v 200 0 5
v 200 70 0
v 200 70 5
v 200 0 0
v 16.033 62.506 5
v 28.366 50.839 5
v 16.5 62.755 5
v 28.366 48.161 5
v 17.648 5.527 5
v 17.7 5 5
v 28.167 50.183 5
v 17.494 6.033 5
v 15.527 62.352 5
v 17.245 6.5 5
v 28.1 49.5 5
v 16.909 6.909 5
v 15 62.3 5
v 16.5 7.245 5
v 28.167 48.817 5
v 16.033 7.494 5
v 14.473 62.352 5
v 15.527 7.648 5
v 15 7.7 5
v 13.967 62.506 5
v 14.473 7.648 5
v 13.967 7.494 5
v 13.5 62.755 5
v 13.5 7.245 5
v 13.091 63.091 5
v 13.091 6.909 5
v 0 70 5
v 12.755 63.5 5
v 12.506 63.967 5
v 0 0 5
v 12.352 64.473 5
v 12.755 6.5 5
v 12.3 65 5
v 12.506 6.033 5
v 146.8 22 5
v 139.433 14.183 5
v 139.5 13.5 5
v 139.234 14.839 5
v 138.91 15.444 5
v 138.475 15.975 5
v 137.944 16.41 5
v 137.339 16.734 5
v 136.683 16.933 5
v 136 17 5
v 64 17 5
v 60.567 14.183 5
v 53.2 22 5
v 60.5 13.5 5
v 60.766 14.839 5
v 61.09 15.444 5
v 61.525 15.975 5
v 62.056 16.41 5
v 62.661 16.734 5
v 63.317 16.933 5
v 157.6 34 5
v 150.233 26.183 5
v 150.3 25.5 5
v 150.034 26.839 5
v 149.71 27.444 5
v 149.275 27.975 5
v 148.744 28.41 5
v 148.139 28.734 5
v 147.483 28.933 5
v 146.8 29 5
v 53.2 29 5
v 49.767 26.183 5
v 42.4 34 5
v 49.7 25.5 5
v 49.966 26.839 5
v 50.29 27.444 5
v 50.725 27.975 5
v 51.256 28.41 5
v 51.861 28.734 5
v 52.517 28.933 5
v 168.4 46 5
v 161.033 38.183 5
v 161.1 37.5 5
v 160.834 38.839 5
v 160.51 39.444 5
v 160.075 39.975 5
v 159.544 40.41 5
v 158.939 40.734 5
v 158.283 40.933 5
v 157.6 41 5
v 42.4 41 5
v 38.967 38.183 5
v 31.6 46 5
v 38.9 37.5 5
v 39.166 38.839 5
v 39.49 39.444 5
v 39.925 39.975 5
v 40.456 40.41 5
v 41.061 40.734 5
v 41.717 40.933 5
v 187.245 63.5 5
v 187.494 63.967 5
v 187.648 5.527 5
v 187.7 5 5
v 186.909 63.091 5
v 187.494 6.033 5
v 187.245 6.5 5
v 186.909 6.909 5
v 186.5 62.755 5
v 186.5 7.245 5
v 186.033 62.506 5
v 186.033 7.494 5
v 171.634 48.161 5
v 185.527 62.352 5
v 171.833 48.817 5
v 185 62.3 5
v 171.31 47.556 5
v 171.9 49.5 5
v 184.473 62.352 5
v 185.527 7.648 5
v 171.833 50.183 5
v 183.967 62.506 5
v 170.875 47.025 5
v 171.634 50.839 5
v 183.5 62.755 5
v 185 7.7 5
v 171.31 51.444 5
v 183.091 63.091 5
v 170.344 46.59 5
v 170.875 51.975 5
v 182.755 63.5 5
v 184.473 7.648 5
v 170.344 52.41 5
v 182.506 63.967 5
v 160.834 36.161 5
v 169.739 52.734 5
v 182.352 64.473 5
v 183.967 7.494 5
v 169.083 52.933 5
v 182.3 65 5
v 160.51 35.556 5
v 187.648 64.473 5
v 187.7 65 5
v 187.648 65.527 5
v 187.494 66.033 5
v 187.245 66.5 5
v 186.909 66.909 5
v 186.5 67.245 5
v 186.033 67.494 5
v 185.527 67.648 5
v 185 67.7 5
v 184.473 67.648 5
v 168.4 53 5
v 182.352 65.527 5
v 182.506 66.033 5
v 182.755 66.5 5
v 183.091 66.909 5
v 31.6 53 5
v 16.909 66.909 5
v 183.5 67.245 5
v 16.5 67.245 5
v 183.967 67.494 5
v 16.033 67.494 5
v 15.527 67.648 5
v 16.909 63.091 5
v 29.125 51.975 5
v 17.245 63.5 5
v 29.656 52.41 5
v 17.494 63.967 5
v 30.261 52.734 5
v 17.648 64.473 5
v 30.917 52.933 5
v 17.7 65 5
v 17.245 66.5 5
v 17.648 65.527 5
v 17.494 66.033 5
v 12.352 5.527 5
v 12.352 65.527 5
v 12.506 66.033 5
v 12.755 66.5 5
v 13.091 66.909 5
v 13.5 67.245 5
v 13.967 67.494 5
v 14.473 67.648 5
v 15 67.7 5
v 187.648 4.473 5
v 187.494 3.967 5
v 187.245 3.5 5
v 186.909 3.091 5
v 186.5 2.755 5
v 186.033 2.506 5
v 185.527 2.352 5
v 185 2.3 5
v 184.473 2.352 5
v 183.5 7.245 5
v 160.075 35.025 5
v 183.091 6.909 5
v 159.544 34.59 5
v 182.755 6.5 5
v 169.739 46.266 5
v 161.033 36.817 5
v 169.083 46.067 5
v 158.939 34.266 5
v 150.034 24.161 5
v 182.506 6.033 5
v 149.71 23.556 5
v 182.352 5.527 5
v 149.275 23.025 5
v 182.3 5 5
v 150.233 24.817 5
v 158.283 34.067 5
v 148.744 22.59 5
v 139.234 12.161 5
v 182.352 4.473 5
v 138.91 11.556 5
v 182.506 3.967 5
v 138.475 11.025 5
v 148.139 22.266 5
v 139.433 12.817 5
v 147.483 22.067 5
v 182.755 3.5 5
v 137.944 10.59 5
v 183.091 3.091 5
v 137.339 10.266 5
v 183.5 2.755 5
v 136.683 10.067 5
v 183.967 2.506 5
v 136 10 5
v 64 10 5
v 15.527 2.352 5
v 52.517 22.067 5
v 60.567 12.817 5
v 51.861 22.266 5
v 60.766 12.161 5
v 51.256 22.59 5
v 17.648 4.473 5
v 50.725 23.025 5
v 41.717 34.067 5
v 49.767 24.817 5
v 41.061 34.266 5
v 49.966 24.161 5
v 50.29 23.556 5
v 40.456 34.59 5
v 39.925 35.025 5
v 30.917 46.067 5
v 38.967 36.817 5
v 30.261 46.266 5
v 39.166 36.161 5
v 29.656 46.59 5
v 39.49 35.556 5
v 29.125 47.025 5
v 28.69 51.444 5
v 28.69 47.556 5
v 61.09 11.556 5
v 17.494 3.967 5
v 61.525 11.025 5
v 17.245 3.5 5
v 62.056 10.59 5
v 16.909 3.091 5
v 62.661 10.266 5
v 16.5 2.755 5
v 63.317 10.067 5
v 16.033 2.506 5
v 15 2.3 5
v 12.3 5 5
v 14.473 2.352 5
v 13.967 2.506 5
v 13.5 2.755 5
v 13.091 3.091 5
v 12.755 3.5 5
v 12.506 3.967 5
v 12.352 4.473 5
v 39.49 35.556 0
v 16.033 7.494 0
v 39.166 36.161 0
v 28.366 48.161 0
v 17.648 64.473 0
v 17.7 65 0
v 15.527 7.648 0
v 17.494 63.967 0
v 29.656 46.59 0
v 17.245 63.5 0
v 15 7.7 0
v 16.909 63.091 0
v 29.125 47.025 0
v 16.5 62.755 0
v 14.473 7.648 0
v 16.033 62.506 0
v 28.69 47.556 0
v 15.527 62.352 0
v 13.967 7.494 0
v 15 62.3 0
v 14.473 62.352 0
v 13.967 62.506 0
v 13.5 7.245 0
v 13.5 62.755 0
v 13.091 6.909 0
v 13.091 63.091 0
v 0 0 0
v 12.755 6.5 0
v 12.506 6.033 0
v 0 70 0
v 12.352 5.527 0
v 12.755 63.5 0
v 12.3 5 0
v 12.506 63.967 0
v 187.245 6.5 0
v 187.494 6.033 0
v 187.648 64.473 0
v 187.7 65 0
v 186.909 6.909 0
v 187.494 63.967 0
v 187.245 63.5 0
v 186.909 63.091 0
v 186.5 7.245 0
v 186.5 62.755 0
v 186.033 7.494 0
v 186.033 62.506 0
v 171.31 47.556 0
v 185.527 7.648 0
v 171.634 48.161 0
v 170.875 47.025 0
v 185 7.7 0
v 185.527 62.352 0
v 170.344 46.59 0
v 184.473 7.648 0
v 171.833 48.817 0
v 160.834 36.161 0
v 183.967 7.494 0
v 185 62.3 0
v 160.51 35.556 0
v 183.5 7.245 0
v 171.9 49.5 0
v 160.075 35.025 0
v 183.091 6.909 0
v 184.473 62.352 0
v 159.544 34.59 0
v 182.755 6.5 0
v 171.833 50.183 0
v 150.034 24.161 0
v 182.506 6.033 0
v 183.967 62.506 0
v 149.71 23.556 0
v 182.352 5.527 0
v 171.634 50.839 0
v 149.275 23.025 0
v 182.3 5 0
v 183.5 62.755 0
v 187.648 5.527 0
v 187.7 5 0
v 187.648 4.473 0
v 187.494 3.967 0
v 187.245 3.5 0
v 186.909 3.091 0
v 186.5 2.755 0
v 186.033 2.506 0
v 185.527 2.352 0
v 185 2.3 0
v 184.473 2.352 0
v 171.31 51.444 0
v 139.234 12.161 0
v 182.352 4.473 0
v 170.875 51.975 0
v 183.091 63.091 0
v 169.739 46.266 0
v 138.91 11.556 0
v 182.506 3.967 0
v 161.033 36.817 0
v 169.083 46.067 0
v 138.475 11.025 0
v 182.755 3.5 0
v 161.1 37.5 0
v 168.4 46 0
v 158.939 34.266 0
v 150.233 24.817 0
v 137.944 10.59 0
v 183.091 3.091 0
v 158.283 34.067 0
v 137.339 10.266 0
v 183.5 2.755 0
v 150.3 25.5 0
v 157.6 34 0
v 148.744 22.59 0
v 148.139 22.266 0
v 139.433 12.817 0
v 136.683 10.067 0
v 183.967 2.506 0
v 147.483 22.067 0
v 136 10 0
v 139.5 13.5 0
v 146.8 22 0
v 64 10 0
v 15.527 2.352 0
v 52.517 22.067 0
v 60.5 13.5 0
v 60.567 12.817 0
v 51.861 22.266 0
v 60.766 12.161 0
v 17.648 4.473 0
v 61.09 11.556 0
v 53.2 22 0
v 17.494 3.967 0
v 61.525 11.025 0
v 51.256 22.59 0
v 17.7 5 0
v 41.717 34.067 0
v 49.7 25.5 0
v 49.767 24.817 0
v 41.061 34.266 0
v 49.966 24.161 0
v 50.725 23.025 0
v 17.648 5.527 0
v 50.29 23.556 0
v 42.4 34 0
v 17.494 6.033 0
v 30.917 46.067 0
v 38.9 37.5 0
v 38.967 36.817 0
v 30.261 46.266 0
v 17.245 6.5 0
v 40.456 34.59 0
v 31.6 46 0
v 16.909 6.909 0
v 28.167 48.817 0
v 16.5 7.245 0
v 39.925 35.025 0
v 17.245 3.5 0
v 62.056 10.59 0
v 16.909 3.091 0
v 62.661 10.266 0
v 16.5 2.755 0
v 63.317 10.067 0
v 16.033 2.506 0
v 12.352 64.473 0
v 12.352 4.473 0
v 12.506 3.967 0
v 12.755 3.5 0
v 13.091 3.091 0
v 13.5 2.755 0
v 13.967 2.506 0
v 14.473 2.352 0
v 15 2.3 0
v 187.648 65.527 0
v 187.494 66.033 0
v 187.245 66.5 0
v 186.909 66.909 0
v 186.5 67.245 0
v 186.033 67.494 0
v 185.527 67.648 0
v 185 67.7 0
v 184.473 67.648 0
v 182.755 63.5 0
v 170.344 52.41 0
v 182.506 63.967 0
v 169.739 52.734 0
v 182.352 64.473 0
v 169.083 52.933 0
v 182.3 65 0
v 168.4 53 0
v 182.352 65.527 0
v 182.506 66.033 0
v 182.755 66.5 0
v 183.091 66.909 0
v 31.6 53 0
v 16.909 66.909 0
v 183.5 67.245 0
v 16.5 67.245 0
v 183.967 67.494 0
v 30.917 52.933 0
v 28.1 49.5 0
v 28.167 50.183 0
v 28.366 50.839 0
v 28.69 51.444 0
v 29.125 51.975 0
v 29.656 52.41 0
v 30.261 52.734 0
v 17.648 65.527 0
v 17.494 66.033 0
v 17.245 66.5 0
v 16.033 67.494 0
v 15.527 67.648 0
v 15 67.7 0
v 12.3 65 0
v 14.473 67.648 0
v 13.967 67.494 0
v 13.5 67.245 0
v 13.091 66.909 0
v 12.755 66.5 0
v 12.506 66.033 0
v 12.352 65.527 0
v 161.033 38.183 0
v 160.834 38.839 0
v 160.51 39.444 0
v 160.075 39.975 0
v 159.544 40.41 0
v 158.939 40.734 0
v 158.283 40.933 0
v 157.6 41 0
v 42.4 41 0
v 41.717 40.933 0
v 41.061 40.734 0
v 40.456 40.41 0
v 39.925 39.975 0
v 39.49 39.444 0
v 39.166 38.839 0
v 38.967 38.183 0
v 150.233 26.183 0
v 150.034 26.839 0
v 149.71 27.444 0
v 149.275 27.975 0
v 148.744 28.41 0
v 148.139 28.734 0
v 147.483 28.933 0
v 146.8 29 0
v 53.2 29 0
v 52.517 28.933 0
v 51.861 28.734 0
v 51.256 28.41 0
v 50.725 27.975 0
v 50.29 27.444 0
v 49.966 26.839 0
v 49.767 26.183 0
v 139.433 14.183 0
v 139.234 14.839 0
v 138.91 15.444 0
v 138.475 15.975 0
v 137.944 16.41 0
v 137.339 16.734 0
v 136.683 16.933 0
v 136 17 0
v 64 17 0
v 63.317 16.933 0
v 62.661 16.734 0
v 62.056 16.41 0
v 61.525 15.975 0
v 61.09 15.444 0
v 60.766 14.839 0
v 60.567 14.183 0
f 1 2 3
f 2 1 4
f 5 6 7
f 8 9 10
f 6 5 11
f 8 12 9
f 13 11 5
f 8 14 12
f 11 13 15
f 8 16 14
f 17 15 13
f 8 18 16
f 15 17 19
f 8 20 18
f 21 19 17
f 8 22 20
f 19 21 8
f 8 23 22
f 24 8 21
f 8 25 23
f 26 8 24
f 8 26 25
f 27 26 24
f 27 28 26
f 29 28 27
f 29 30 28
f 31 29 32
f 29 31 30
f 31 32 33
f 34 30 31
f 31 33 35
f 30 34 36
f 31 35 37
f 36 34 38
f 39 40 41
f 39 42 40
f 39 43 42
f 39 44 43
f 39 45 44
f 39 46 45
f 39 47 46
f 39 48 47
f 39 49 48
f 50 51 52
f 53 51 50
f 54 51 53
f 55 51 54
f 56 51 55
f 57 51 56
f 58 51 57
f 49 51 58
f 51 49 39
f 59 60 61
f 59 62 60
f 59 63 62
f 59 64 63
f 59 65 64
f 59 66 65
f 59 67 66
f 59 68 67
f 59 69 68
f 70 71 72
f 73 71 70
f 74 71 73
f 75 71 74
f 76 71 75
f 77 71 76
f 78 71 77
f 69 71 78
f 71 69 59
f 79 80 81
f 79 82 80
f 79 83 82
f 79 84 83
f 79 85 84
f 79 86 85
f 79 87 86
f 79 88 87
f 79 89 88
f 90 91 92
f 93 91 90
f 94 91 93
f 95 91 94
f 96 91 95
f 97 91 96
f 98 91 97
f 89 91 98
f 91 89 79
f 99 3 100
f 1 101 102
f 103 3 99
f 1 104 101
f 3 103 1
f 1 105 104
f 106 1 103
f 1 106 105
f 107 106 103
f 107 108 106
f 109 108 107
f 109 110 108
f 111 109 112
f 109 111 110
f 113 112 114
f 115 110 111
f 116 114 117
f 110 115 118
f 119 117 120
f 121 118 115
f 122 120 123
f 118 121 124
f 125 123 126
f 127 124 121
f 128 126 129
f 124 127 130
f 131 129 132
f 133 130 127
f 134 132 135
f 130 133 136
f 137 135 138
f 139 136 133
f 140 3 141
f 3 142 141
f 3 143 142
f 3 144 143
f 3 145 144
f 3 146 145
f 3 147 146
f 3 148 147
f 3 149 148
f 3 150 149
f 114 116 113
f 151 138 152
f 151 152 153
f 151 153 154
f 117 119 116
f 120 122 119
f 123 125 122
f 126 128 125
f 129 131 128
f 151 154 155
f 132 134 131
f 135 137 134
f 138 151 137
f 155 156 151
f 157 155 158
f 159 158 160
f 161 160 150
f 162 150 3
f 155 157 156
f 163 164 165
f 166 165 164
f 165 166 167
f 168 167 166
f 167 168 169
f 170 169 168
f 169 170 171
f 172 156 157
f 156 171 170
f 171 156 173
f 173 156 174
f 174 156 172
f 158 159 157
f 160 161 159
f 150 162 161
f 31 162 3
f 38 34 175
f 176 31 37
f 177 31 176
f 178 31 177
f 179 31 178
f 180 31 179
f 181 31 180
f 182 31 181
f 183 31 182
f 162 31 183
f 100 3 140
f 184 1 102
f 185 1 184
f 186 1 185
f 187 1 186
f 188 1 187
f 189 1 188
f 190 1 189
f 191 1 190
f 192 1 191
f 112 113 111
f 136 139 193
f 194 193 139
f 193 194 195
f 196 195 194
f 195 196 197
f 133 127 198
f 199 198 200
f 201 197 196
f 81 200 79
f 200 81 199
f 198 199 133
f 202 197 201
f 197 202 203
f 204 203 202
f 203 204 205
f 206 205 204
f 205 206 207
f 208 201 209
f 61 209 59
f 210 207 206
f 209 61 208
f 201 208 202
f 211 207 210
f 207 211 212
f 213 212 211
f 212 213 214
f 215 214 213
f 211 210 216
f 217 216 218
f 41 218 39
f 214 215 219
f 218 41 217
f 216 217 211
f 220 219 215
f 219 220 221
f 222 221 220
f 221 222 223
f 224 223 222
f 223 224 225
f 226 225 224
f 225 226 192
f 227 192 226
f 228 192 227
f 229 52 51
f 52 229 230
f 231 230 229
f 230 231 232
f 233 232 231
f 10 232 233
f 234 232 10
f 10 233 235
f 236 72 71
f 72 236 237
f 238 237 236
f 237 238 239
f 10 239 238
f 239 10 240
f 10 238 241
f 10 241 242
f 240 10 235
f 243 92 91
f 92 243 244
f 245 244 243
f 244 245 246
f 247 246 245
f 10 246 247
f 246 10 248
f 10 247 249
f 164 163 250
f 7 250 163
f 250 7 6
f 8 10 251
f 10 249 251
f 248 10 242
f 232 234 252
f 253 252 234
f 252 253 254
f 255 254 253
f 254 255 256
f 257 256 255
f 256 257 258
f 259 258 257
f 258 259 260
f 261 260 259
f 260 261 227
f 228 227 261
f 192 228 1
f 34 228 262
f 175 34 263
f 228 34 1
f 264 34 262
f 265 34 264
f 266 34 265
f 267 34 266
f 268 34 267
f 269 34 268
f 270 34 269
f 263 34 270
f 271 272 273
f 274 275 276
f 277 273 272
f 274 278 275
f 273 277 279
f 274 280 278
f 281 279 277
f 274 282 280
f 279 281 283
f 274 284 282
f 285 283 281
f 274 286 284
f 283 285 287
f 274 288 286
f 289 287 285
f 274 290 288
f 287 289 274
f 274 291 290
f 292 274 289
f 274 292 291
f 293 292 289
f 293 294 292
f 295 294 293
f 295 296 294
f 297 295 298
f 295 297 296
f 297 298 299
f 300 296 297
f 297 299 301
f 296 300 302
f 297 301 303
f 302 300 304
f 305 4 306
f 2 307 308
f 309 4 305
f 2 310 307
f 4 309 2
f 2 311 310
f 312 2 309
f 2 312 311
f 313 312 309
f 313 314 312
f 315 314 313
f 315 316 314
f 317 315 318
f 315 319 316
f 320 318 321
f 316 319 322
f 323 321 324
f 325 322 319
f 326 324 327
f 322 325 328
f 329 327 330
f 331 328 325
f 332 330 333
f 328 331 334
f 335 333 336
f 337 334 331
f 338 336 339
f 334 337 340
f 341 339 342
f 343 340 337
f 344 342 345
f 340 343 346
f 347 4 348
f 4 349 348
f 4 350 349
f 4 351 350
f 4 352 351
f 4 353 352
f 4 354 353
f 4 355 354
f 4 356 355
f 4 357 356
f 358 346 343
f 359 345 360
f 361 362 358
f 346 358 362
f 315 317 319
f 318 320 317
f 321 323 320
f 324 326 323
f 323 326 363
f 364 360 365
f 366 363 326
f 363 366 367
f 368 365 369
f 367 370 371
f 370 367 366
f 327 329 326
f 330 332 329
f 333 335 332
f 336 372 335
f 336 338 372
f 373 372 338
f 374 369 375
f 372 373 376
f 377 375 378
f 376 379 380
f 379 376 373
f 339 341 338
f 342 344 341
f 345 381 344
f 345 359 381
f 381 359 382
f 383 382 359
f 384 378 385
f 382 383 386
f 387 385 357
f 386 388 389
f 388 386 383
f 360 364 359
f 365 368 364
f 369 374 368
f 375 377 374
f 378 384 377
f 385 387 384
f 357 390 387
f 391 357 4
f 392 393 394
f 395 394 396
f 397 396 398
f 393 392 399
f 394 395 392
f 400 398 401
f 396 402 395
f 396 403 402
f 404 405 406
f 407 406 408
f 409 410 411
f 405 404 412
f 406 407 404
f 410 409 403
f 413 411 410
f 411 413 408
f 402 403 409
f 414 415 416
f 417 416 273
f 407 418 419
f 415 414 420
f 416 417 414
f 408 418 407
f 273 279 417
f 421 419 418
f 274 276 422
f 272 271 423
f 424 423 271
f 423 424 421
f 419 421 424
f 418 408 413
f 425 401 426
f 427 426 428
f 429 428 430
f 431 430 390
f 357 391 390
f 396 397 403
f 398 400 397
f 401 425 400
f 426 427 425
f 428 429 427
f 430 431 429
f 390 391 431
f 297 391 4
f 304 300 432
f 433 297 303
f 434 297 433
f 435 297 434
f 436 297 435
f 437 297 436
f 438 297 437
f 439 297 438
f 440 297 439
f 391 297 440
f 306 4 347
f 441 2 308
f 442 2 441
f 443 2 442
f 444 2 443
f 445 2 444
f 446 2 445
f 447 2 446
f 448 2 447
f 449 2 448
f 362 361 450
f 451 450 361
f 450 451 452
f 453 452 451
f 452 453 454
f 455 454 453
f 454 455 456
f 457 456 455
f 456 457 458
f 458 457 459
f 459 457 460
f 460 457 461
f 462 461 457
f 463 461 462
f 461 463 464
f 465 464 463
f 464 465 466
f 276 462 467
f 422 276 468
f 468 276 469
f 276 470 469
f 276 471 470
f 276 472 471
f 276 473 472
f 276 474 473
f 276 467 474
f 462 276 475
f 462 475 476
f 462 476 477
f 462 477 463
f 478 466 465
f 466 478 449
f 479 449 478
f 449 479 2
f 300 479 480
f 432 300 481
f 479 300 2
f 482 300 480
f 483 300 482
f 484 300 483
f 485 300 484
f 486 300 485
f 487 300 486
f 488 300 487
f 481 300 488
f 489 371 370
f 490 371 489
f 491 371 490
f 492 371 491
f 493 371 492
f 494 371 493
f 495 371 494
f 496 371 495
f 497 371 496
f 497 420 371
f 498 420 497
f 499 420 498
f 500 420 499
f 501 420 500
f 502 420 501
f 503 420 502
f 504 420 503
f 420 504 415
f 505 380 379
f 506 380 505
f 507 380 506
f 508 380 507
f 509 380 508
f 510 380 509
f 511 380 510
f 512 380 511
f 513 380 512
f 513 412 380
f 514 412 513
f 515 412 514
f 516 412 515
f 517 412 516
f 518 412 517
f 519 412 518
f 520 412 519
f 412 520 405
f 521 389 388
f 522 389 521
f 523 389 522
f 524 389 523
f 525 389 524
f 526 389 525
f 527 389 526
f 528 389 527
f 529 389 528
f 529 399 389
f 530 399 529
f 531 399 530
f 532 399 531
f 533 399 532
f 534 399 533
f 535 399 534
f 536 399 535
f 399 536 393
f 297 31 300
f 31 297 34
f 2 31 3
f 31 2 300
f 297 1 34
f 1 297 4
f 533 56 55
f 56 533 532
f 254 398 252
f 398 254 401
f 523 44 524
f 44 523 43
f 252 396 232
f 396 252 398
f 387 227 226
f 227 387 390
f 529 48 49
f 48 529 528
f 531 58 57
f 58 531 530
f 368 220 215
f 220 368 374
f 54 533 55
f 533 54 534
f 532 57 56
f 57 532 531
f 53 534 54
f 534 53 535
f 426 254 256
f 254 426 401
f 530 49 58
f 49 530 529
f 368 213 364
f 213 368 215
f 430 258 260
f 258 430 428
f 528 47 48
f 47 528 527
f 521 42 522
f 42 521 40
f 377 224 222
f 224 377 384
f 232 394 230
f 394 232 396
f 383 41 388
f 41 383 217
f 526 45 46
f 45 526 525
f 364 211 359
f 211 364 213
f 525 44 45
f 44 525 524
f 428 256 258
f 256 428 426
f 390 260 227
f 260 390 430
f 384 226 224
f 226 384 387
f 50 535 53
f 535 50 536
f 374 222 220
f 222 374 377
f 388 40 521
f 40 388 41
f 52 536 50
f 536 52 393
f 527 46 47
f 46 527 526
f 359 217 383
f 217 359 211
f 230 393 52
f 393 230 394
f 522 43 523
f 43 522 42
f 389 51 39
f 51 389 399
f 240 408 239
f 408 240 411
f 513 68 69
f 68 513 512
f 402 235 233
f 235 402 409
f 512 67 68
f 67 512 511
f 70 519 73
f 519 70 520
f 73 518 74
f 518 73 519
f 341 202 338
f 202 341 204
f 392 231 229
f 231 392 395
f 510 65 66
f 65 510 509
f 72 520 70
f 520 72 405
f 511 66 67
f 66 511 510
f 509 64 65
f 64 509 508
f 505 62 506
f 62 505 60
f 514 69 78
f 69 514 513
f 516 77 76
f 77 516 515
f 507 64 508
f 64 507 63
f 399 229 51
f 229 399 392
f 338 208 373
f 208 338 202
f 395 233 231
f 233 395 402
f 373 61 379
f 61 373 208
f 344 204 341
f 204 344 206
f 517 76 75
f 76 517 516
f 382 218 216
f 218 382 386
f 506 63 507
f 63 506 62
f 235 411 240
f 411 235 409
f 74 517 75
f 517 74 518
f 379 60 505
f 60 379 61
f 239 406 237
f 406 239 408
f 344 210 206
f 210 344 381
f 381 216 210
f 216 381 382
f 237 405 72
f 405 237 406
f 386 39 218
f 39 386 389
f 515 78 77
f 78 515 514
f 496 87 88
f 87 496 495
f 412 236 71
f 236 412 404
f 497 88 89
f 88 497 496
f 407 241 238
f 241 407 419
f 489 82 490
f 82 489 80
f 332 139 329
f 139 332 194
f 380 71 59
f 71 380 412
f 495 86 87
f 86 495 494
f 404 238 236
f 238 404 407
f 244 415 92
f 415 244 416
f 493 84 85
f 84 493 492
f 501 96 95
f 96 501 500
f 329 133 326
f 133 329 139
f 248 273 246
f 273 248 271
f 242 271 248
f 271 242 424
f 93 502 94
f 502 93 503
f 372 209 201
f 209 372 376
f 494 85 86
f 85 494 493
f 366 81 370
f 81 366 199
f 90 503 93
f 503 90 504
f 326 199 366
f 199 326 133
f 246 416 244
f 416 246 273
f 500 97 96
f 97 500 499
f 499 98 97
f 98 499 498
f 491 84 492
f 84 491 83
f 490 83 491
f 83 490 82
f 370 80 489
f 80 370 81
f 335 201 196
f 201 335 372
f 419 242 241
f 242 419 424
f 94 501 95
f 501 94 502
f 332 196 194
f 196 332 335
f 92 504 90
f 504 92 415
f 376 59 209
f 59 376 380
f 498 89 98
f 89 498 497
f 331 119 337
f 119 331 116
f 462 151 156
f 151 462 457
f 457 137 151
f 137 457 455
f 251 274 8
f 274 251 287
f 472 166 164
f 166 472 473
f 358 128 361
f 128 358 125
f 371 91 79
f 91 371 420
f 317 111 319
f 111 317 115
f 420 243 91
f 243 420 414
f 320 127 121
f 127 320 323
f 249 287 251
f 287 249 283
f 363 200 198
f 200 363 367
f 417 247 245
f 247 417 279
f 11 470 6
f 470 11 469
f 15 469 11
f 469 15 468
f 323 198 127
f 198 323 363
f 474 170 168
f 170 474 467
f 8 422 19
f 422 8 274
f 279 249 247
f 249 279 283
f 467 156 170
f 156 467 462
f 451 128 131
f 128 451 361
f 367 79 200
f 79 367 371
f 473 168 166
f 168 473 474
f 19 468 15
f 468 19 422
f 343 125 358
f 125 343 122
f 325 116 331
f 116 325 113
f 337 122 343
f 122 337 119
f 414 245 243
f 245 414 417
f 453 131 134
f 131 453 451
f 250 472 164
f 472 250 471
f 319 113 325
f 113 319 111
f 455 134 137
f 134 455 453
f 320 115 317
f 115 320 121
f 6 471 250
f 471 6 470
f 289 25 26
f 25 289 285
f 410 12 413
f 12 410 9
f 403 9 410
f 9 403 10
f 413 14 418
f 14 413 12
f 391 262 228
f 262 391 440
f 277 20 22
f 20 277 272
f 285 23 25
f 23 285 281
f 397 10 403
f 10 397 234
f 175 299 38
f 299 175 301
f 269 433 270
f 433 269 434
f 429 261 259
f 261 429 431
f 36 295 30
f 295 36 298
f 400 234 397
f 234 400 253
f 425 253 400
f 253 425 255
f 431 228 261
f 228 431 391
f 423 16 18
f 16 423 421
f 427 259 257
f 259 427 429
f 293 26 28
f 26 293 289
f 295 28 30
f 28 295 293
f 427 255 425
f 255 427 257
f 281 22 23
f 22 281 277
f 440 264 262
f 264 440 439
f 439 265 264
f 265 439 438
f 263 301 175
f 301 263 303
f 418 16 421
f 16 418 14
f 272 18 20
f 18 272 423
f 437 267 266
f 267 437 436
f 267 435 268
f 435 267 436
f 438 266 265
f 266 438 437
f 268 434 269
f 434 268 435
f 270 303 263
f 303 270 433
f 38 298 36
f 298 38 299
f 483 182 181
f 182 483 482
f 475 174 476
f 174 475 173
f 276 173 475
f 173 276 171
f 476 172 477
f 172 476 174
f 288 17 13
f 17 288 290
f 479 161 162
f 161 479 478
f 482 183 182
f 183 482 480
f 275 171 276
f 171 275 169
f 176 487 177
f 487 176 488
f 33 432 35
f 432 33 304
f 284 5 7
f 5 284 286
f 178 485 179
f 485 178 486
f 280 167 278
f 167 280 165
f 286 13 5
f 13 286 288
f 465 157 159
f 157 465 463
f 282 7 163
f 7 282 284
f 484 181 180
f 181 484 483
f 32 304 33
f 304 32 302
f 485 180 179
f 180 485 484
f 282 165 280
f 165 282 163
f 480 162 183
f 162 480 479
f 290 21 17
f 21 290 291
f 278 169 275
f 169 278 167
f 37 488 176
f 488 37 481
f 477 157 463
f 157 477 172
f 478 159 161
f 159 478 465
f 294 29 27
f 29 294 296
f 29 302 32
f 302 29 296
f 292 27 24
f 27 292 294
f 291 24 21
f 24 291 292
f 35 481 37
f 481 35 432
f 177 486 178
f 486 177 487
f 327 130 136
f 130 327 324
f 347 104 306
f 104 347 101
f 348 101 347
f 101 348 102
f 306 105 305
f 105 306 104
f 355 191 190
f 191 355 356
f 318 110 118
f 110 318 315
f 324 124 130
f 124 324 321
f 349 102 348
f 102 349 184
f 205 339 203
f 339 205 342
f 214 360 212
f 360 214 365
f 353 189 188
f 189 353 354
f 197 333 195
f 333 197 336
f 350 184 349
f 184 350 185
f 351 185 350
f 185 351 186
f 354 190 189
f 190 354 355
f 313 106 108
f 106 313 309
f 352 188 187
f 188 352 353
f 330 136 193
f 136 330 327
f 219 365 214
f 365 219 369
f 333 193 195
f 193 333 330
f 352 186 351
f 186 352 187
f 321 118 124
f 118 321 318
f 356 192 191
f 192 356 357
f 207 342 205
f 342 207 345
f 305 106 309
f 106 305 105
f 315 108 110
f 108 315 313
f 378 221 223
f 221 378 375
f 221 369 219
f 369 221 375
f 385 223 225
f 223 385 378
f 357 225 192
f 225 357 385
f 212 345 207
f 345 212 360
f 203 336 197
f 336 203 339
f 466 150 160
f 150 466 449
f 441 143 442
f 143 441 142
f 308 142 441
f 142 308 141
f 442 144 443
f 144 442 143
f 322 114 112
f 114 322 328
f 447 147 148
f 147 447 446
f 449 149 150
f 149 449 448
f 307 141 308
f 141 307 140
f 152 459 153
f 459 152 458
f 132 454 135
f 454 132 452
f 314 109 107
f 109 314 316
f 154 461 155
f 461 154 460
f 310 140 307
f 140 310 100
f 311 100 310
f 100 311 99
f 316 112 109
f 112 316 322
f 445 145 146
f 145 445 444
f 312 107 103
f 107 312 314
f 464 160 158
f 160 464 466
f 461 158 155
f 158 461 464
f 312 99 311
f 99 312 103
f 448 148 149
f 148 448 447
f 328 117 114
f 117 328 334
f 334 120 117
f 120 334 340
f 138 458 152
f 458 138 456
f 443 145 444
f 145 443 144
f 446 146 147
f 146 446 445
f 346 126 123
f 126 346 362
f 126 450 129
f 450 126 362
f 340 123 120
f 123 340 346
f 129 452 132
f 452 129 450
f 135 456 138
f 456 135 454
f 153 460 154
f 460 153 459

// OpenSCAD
$fn = 32;

// ----------------------------------------------------------------------
// Slotted panel: 200 x 70 mm, 4 ряда of slots
// ----------------------------------------------------------------------

// --- parameters (mm) ---
panel_w = 200;            // panel width
panel_d = 70;             // panel depth
thick = 5;                // panel thickness
slot_w = 7;               // slot width
pitch0 = 12;              // first row pitch
pitch_step = 1.8;         // pitch increase per row
margin = 10;              // margin around the slot field
rows = 4;                 // number of slot rows
mount_d = 5.4;            // mounting holes
mount_x = 85;             // mounting hole offset

difference() {
  union() {
    cube([panel_w, panel_d, thick]);
  }
  /* slot rows: stadium shaped cutters, 2.5 mm clear of both faces */
  /* row 0: pitch 12, length 72 */
  hull() {
    translate([64, 13.5, -2.5]) cylinder(h = thick + 5, d = slot_w);
    translate([136, 13.5, -2.5]) cylinder(h = thick + 5, d = slot_w);
  }
  /* row 1: pitch 12, length 93.6 */
  hull() {
    translate([53.2, 25.5, -2.5]) cylinder(h = thick + 5, d = slot_w);
    translate([146.8, 25.5, -2.5]) cylinder(h = thick + 5, d = slot_w);
  }
  /* row 2: pitch 12, length 115.2 */
  hull() {
    translate([42.4, 37.5, -2.5]) cylinder(h = thick + 5, d = slot_w);
    translate([157.6, 37.5, -2.5]) cylinder(h = thick + 5, d = slot_w);
  }
  /* row 3: pitch 12, length 136.8 */
  hull() {
    translate([31.6, 49.5, -2.5]) cylinder(h = thick + 5, d = slot_w);
    translate([168.4, 49.5, -2.5]) cylinder(h = thick + 5, d = slot_w);
  }
  translate([15, 5, -2.5]) cylinder(h = 10, d = mount_d);
  translate([15, 65, -2.5]) cylinder(h = 10, d = mount_d);
  translate([185, 5, -2.5]) cylinder(h = 10, d = mount_d);
  translate([185, 65, -2.5]) cylinder(h = 10, d = mount_d);
}
